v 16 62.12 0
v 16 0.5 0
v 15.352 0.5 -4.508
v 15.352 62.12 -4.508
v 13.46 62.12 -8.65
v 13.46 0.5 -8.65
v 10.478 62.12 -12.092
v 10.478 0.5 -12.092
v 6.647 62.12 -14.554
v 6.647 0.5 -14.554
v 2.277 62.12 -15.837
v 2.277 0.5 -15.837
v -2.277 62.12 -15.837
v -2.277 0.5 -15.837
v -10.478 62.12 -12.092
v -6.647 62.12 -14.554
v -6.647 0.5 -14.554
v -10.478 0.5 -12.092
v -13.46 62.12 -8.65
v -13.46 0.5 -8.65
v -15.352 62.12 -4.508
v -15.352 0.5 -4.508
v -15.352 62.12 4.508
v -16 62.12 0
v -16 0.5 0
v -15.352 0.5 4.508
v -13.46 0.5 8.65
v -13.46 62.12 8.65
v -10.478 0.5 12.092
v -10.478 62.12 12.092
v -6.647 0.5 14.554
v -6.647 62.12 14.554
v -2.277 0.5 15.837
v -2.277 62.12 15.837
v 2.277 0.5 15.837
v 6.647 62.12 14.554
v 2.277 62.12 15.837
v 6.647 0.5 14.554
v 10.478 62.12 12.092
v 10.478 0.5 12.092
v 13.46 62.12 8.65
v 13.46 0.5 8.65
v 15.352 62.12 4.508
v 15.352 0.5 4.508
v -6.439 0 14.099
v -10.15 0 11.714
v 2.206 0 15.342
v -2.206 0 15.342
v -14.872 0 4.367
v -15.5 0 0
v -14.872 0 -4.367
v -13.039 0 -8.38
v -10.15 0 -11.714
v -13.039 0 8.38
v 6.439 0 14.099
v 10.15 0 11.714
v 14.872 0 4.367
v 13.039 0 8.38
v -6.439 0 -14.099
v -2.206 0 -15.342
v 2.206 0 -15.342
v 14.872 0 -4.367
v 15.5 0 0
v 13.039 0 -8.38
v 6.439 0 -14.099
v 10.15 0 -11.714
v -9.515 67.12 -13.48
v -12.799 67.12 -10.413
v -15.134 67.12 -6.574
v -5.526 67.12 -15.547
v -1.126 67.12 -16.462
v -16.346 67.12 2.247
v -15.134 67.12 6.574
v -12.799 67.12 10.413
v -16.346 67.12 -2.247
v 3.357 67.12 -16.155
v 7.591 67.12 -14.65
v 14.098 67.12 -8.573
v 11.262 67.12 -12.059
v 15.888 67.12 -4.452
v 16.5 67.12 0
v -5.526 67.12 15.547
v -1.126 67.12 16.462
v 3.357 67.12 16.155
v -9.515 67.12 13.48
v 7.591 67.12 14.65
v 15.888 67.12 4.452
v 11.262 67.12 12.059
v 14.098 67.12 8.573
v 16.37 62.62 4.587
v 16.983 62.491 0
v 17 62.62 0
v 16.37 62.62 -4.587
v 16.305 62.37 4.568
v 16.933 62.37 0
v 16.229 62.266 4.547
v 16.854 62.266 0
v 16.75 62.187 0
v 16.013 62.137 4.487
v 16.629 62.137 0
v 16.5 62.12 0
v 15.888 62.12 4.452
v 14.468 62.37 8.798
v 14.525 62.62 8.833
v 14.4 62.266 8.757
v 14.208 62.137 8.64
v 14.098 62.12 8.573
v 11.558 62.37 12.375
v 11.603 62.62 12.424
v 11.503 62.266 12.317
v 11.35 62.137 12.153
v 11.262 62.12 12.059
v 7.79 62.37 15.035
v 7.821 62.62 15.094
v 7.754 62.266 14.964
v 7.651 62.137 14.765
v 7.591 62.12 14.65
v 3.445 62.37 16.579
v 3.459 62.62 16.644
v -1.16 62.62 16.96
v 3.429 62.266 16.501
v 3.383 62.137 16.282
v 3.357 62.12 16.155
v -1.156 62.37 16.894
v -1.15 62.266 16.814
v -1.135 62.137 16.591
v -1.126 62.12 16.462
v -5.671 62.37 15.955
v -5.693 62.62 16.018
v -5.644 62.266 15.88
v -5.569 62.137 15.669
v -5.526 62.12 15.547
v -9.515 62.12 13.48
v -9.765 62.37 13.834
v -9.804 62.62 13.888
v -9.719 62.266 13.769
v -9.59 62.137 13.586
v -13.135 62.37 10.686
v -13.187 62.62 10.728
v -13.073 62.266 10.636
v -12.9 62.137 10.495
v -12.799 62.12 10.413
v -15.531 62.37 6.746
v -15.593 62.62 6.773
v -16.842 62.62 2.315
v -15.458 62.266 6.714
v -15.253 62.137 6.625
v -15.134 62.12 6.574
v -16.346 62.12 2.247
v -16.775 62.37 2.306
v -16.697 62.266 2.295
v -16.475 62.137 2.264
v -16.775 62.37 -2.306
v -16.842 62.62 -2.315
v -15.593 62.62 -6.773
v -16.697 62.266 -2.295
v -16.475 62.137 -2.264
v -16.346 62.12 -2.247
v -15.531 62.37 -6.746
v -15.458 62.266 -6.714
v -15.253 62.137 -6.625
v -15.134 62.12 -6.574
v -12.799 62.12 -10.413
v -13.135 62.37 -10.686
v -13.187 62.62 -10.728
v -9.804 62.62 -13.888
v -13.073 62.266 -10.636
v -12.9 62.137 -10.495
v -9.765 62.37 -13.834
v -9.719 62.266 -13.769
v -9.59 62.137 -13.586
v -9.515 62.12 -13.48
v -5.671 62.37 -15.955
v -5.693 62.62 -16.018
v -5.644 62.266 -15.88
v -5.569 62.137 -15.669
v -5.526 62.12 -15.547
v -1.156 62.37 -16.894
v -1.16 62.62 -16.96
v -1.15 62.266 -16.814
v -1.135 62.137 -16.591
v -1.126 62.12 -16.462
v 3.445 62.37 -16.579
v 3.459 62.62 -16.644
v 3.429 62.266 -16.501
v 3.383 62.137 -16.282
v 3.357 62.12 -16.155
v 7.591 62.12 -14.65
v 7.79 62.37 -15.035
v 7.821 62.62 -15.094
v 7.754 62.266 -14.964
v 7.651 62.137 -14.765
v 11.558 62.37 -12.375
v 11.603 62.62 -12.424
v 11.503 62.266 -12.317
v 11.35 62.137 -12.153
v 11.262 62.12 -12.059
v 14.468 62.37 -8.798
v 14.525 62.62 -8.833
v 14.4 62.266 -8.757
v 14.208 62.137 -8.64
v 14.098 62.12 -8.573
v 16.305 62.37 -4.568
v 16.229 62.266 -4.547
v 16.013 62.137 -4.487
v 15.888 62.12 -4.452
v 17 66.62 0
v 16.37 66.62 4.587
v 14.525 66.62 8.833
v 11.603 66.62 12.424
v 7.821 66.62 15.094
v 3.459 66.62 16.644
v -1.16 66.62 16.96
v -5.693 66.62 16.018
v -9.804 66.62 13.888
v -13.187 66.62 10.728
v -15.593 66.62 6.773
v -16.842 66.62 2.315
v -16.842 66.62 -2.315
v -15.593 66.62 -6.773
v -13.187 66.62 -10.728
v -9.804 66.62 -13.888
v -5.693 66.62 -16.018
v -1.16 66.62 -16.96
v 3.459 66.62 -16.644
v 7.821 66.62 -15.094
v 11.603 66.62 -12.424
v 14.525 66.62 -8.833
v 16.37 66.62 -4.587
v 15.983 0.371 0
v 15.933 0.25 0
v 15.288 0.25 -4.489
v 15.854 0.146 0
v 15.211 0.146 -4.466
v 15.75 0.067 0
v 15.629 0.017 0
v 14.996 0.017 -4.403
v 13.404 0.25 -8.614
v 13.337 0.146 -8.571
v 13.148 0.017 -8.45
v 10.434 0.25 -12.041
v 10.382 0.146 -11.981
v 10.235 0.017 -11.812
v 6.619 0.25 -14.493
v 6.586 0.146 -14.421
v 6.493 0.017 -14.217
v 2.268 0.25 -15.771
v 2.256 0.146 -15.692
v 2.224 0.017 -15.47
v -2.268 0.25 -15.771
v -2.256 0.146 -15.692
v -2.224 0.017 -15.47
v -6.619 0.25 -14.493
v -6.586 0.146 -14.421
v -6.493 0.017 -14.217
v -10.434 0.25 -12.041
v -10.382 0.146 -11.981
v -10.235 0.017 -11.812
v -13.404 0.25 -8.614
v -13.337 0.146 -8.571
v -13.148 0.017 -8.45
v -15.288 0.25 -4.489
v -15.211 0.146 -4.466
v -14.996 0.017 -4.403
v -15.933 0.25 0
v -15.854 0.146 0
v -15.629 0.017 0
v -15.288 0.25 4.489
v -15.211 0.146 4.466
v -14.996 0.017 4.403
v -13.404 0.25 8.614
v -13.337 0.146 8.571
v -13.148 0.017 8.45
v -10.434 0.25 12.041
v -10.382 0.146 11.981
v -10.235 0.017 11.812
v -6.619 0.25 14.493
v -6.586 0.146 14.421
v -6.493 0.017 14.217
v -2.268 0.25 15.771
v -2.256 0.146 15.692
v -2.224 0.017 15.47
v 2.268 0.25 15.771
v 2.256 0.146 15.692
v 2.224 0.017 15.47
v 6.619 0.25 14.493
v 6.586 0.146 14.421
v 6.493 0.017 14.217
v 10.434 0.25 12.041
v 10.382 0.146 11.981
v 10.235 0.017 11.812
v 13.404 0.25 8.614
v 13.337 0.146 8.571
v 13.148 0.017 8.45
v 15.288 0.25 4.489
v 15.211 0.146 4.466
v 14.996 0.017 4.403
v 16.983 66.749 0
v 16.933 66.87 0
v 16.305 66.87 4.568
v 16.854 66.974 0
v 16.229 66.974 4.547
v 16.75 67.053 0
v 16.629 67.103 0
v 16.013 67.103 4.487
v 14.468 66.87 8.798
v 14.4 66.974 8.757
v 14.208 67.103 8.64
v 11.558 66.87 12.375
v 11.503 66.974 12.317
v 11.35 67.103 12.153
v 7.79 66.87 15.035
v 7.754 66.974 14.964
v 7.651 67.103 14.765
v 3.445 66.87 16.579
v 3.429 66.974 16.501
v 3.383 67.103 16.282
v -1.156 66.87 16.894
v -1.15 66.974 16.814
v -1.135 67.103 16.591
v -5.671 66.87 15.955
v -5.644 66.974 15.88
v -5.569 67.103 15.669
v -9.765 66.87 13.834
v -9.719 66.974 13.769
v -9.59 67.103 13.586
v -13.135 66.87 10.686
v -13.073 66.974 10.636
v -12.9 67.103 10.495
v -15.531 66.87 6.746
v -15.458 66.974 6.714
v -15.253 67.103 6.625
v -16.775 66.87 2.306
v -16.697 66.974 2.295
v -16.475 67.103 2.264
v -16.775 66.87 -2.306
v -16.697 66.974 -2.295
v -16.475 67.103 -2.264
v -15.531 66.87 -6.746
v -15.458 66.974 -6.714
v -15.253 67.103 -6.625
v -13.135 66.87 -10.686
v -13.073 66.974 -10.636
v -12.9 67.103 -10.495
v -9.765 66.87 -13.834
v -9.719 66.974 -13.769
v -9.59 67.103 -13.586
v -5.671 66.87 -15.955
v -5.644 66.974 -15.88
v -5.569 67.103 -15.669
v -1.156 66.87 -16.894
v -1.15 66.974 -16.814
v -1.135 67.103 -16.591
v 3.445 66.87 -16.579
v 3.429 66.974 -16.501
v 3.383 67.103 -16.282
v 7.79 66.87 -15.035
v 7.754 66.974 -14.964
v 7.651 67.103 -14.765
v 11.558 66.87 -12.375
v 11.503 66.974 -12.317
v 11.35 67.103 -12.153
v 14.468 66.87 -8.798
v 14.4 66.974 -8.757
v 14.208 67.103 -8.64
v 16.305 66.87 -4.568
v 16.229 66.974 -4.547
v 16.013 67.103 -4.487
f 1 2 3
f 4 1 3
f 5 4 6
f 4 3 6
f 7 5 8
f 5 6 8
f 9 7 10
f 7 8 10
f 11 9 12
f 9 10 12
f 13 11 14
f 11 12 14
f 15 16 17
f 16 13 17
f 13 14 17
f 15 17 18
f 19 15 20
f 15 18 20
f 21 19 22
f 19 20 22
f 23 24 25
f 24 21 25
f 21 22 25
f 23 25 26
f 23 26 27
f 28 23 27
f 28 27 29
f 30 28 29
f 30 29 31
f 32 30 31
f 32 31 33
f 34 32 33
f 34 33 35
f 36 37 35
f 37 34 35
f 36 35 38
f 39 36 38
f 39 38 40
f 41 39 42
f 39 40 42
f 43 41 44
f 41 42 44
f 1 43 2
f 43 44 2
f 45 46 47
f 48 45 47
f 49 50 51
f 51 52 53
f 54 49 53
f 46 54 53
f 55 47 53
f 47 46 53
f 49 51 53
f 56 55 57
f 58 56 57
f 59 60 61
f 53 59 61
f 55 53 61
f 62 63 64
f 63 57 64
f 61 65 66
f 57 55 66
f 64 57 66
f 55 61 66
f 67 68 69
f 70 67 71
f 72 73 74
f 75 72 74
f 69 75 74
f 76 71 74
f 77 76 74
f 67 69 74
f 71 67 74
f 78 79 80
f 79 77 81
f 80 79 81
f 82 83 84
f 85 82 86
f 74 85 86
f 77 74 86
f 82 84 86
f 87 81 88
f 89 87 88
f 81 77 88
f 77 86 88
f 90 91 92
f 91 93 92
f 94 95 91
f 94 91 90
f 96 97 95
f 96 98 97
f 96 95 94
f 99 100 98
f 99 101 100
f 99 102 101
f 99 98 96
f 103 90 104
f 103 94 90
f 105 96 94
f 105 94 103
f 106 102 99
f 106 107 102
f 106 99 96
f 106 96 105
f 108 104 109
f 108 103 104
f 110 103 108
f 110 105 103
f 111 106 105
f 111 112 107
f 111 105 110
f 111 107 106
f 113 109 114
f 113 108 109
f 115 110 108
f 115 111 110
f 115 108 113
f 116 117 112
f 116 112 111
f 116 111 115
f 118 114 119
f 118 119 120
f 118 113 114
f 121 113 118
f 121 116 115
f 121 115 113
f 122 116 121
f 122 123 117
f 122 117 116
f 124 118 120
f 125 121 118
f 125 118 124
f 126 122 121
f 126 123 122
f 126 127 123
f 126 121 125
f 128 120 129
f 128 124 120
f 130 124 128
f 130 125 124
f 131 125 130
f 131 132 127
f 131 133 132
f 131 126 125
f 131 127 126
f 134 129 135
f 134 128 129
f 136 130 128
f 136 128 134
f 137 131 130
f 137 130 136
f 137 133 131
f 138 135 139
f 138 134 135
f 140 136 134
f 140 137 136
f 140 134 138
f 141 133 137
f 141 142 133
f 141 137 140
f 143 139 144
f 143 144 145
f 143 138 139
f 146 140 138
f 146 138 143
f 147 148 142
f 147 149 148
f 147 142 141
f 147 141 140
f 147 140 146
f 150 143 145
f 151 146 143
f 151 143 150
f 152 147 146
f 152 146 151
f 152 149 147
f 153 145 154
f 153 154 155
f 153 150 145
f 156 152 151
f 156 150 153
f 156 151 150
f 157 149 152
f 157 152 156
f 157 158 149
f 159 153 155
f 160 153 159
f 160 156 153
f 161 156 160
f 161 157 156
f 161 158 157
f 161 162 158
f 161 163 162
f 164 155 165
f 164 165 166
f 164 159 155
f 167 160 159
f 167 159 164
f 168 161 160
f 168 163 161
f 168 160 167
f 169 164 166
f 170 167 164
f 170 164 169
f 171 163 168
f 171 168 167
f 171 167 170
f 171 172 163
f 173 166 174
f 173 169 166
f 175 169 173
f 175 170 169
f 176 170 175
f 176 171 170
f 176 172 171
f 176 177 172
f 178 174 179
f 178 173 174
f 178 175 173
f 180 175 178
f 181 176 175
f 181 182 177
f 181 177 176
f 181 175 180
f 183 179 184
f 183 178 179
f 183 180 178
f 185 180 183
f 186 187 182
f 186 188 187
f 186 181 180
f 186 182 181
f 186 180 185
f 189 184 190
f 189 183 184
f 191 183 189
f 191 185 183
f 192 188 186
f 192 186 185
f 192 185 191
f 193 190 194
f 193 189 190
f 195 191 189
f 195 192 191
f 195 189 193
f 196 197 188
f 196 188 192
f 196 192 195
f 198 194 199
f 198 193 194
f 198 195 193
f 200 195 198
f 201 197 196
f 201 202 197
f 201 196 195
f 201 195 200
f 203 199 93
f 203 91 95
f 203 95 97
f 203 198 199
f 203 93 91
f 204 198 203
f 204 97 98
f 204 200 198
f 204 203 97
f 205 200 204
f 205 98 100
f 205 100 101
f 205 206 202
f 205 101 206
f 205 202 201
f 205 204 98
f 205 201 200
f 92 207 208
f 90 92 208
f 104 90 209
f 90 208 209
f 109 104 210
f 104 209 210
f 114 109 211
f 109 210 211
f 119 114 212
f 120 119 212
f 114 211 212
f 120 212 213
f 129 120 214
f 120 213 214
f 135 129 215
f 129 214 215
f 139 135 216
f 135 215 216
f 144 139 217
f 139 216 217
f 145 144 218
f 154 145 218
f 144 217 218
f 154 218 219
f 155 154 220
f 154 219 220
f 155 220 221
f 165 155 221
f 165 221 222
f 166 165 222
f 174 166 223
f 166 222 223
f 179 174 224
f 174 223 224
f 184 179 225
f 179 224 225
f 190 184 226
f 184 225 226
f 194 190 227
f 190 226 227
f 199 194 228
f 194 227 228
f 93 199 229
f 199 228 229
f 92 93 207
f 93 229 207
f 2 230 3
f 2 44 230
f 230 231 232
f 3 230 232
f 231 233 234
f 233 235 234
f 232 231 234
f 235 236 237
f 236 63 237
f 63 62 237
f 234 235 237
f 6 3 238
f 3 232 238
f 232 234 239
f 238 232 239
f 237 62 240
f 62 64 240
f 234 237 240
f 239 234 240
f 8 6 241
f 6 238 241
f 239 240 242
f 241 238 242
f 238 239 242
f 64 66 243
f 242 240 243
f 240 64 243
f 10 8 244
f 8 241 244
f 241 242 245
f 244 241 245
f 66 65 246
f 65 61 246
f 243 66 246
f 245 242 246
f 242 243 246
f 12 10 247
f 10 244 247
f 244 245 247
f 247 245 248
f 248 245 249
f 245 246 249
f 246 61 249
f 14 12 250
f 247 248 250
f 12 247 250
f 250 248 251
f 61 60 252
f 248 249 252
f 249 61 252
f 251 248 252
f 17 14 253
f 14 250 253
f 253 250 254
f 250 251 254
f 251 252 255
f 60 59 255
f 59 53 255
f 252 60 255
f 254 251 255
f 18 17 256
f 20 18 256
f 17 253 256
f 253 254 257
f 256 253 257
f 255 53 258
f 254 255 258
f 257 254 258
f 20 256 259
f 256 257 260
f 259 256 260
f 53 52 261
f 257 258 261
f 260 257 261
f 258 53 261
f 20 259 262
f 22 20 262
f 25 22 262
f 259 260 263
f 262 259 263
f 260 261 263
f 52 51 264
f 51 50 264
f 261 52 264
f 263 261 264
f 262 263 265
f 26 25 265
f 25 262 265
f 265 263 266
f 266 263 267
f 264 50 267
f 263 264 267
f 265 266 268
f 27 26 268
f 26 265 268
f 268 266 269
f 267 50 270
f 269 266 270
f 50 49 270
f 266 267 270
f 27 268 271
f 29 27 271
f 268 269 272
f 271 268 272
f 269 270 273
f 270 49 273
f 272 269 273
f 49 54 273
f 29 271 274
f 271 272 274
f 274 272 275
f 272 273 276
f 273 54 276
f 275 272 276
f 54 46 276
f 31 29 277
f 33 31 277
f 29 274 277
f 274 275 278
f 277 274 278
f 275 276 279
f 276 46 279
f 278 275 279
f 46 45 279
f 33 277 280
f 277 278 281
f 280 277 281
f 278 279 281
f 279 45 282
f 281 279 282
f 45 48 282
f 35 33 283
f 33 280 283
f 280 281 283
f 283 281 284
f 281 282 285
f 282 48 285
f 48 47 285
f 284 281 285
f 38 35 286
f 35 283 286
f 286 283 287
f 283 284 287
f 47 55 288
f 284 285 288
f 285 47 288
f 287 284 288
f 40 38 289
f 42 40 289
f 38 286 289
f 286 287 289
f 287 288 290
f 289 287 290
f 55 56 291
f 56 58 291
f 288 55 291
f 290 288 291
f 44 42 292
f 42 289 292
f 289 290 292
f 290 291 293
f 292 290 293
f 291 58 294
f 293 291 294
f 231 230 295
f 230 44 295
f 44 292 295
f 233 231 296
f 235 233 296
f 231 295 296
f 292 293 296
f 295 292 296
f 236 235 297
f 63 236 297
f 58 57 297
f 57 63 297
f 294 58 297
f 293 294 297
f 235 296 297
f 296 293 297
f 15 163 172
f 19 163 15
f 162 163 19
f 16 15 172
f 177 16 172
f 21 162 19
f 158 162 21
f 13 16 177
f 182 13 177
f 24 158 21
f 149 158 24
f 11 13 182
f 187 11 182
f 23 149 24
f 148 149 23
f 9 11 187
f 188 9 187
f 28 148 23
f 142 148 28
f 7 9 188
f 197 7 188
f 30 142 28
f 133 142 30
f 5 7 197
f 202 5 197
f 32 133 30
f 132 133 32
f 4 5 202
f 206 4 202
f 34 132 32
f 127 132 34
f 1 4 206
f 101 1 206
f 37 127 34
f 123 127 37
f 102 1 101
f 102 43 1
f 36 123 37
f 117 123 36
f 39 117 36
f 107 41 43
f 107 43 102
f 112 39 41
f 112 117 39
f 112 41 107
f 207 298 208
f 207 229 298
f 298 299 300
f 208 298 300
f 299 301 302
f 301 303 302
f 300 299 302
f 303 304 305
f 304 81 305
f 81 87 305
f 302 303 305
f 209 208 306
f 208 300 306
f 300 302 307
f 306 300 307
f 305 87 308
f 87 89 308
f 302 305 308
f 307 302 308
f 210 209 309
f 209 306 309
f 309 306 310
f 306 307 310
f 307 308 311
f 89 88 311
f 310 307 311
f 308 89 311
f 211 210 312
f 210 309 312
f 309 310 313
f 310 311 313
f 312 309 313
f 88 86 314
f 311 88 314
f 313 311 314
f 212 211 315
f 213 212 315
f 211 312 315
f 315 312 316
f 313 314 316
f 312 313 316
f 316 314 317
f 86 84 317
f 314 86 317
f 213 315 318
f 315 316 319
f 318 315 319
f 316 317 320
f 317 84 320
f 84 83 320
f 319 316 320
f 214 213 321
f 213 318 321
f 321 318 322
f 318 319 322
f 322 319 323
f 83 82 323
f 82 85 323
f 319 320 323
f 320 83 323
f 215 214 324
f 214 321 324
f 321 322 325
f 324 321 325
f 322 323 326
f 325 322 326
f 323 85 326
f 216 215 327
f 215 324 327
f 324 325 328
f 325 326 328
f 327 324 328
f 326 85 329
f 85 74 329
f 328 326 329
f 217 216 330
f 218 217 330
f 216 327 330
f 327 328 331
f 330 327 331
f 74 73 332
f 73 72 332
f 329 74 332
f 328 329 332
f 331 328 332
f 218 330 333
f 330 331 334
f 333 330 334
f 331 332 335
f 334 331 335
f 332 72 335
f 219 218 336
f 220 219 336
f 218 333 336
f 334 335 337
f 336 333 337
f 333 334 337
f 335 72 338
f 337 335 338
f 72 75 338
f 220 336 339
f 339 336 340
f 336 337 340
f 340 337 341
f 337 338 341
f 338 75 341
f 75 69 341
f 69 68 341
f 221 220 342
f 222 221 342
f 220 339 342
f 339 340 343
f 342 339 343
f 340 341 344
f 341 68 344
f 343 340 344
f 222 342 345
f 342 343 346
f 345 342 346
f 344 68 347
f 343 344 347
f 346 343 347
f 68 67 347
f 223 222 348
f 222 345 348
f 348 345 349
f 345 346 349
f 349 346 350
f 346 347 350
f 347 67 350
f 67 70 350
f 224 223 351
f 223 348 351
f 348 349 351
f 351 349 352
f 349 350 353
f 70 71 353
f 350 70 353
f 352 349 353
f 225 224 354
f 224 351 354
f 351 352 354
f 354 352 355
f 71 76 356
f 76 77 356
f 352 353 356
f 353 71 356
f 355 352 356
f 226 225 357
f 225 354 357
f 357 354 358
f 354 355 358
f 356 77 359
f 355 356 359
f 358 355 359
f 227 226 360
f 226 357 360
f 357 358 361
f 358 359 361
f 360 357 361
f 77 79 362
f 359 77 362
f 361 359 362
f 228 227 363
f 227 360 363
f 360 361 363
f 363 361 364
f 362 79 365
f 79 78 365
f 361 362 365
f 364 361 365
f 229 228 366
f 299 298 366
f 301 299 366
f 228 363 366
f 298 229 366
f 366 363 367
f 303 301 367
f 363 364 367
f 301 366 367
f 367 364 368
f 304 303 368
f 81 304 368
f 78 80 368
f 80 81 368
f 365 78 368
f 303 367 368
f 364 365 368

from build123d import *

# Parameters (mm, degrees)
SKETCH1_R           = 16
BOSS_EXTRUDE1_DEPTH = 67.12
BOSS_EXTRUDE2_START = -67.12
SKETCH2_R           = 17
SKETCH2_R_2         = 16
BOSS_EXTRUDE2_DEPTH = 5
FILLET1_R           = 0.5


with BuildPart() as part:
    # Sketch1 → Boss-Extrude1 (new body)
    with BuildSketch(Plane(origin=(0, 0, 0), x_dir=(1, 0, 0), z_dir=(0, 1, 0))):
        Circle(SKETCH1_R)
    extrude(amount=BOSS_EXTRUDE1_DEPTH)

    # Sketch2 → Boss-Extrude2 (add)
    with BuildSketch(Plane.XZ.offset(BOSS_EXTRUDE2_START)):
        Circle(SKETCH2_R)
        Circle(SKETCH2_R_2, mode=Mode.SUBTRACT)
    extrude(amount=BOSS_EXTRUDE2_DEPTH)

    # Fillet1
    fillet1_edges = [part.edges().sort_by_distance(p)[0] for p in [
        (-16, 0, 0),
        (-17, 62.12, 0),
        (-17, 67.12, 0),
    ]]
    fillet(fillet1_edges, radius=FILLET1_R)


solid = part.part
